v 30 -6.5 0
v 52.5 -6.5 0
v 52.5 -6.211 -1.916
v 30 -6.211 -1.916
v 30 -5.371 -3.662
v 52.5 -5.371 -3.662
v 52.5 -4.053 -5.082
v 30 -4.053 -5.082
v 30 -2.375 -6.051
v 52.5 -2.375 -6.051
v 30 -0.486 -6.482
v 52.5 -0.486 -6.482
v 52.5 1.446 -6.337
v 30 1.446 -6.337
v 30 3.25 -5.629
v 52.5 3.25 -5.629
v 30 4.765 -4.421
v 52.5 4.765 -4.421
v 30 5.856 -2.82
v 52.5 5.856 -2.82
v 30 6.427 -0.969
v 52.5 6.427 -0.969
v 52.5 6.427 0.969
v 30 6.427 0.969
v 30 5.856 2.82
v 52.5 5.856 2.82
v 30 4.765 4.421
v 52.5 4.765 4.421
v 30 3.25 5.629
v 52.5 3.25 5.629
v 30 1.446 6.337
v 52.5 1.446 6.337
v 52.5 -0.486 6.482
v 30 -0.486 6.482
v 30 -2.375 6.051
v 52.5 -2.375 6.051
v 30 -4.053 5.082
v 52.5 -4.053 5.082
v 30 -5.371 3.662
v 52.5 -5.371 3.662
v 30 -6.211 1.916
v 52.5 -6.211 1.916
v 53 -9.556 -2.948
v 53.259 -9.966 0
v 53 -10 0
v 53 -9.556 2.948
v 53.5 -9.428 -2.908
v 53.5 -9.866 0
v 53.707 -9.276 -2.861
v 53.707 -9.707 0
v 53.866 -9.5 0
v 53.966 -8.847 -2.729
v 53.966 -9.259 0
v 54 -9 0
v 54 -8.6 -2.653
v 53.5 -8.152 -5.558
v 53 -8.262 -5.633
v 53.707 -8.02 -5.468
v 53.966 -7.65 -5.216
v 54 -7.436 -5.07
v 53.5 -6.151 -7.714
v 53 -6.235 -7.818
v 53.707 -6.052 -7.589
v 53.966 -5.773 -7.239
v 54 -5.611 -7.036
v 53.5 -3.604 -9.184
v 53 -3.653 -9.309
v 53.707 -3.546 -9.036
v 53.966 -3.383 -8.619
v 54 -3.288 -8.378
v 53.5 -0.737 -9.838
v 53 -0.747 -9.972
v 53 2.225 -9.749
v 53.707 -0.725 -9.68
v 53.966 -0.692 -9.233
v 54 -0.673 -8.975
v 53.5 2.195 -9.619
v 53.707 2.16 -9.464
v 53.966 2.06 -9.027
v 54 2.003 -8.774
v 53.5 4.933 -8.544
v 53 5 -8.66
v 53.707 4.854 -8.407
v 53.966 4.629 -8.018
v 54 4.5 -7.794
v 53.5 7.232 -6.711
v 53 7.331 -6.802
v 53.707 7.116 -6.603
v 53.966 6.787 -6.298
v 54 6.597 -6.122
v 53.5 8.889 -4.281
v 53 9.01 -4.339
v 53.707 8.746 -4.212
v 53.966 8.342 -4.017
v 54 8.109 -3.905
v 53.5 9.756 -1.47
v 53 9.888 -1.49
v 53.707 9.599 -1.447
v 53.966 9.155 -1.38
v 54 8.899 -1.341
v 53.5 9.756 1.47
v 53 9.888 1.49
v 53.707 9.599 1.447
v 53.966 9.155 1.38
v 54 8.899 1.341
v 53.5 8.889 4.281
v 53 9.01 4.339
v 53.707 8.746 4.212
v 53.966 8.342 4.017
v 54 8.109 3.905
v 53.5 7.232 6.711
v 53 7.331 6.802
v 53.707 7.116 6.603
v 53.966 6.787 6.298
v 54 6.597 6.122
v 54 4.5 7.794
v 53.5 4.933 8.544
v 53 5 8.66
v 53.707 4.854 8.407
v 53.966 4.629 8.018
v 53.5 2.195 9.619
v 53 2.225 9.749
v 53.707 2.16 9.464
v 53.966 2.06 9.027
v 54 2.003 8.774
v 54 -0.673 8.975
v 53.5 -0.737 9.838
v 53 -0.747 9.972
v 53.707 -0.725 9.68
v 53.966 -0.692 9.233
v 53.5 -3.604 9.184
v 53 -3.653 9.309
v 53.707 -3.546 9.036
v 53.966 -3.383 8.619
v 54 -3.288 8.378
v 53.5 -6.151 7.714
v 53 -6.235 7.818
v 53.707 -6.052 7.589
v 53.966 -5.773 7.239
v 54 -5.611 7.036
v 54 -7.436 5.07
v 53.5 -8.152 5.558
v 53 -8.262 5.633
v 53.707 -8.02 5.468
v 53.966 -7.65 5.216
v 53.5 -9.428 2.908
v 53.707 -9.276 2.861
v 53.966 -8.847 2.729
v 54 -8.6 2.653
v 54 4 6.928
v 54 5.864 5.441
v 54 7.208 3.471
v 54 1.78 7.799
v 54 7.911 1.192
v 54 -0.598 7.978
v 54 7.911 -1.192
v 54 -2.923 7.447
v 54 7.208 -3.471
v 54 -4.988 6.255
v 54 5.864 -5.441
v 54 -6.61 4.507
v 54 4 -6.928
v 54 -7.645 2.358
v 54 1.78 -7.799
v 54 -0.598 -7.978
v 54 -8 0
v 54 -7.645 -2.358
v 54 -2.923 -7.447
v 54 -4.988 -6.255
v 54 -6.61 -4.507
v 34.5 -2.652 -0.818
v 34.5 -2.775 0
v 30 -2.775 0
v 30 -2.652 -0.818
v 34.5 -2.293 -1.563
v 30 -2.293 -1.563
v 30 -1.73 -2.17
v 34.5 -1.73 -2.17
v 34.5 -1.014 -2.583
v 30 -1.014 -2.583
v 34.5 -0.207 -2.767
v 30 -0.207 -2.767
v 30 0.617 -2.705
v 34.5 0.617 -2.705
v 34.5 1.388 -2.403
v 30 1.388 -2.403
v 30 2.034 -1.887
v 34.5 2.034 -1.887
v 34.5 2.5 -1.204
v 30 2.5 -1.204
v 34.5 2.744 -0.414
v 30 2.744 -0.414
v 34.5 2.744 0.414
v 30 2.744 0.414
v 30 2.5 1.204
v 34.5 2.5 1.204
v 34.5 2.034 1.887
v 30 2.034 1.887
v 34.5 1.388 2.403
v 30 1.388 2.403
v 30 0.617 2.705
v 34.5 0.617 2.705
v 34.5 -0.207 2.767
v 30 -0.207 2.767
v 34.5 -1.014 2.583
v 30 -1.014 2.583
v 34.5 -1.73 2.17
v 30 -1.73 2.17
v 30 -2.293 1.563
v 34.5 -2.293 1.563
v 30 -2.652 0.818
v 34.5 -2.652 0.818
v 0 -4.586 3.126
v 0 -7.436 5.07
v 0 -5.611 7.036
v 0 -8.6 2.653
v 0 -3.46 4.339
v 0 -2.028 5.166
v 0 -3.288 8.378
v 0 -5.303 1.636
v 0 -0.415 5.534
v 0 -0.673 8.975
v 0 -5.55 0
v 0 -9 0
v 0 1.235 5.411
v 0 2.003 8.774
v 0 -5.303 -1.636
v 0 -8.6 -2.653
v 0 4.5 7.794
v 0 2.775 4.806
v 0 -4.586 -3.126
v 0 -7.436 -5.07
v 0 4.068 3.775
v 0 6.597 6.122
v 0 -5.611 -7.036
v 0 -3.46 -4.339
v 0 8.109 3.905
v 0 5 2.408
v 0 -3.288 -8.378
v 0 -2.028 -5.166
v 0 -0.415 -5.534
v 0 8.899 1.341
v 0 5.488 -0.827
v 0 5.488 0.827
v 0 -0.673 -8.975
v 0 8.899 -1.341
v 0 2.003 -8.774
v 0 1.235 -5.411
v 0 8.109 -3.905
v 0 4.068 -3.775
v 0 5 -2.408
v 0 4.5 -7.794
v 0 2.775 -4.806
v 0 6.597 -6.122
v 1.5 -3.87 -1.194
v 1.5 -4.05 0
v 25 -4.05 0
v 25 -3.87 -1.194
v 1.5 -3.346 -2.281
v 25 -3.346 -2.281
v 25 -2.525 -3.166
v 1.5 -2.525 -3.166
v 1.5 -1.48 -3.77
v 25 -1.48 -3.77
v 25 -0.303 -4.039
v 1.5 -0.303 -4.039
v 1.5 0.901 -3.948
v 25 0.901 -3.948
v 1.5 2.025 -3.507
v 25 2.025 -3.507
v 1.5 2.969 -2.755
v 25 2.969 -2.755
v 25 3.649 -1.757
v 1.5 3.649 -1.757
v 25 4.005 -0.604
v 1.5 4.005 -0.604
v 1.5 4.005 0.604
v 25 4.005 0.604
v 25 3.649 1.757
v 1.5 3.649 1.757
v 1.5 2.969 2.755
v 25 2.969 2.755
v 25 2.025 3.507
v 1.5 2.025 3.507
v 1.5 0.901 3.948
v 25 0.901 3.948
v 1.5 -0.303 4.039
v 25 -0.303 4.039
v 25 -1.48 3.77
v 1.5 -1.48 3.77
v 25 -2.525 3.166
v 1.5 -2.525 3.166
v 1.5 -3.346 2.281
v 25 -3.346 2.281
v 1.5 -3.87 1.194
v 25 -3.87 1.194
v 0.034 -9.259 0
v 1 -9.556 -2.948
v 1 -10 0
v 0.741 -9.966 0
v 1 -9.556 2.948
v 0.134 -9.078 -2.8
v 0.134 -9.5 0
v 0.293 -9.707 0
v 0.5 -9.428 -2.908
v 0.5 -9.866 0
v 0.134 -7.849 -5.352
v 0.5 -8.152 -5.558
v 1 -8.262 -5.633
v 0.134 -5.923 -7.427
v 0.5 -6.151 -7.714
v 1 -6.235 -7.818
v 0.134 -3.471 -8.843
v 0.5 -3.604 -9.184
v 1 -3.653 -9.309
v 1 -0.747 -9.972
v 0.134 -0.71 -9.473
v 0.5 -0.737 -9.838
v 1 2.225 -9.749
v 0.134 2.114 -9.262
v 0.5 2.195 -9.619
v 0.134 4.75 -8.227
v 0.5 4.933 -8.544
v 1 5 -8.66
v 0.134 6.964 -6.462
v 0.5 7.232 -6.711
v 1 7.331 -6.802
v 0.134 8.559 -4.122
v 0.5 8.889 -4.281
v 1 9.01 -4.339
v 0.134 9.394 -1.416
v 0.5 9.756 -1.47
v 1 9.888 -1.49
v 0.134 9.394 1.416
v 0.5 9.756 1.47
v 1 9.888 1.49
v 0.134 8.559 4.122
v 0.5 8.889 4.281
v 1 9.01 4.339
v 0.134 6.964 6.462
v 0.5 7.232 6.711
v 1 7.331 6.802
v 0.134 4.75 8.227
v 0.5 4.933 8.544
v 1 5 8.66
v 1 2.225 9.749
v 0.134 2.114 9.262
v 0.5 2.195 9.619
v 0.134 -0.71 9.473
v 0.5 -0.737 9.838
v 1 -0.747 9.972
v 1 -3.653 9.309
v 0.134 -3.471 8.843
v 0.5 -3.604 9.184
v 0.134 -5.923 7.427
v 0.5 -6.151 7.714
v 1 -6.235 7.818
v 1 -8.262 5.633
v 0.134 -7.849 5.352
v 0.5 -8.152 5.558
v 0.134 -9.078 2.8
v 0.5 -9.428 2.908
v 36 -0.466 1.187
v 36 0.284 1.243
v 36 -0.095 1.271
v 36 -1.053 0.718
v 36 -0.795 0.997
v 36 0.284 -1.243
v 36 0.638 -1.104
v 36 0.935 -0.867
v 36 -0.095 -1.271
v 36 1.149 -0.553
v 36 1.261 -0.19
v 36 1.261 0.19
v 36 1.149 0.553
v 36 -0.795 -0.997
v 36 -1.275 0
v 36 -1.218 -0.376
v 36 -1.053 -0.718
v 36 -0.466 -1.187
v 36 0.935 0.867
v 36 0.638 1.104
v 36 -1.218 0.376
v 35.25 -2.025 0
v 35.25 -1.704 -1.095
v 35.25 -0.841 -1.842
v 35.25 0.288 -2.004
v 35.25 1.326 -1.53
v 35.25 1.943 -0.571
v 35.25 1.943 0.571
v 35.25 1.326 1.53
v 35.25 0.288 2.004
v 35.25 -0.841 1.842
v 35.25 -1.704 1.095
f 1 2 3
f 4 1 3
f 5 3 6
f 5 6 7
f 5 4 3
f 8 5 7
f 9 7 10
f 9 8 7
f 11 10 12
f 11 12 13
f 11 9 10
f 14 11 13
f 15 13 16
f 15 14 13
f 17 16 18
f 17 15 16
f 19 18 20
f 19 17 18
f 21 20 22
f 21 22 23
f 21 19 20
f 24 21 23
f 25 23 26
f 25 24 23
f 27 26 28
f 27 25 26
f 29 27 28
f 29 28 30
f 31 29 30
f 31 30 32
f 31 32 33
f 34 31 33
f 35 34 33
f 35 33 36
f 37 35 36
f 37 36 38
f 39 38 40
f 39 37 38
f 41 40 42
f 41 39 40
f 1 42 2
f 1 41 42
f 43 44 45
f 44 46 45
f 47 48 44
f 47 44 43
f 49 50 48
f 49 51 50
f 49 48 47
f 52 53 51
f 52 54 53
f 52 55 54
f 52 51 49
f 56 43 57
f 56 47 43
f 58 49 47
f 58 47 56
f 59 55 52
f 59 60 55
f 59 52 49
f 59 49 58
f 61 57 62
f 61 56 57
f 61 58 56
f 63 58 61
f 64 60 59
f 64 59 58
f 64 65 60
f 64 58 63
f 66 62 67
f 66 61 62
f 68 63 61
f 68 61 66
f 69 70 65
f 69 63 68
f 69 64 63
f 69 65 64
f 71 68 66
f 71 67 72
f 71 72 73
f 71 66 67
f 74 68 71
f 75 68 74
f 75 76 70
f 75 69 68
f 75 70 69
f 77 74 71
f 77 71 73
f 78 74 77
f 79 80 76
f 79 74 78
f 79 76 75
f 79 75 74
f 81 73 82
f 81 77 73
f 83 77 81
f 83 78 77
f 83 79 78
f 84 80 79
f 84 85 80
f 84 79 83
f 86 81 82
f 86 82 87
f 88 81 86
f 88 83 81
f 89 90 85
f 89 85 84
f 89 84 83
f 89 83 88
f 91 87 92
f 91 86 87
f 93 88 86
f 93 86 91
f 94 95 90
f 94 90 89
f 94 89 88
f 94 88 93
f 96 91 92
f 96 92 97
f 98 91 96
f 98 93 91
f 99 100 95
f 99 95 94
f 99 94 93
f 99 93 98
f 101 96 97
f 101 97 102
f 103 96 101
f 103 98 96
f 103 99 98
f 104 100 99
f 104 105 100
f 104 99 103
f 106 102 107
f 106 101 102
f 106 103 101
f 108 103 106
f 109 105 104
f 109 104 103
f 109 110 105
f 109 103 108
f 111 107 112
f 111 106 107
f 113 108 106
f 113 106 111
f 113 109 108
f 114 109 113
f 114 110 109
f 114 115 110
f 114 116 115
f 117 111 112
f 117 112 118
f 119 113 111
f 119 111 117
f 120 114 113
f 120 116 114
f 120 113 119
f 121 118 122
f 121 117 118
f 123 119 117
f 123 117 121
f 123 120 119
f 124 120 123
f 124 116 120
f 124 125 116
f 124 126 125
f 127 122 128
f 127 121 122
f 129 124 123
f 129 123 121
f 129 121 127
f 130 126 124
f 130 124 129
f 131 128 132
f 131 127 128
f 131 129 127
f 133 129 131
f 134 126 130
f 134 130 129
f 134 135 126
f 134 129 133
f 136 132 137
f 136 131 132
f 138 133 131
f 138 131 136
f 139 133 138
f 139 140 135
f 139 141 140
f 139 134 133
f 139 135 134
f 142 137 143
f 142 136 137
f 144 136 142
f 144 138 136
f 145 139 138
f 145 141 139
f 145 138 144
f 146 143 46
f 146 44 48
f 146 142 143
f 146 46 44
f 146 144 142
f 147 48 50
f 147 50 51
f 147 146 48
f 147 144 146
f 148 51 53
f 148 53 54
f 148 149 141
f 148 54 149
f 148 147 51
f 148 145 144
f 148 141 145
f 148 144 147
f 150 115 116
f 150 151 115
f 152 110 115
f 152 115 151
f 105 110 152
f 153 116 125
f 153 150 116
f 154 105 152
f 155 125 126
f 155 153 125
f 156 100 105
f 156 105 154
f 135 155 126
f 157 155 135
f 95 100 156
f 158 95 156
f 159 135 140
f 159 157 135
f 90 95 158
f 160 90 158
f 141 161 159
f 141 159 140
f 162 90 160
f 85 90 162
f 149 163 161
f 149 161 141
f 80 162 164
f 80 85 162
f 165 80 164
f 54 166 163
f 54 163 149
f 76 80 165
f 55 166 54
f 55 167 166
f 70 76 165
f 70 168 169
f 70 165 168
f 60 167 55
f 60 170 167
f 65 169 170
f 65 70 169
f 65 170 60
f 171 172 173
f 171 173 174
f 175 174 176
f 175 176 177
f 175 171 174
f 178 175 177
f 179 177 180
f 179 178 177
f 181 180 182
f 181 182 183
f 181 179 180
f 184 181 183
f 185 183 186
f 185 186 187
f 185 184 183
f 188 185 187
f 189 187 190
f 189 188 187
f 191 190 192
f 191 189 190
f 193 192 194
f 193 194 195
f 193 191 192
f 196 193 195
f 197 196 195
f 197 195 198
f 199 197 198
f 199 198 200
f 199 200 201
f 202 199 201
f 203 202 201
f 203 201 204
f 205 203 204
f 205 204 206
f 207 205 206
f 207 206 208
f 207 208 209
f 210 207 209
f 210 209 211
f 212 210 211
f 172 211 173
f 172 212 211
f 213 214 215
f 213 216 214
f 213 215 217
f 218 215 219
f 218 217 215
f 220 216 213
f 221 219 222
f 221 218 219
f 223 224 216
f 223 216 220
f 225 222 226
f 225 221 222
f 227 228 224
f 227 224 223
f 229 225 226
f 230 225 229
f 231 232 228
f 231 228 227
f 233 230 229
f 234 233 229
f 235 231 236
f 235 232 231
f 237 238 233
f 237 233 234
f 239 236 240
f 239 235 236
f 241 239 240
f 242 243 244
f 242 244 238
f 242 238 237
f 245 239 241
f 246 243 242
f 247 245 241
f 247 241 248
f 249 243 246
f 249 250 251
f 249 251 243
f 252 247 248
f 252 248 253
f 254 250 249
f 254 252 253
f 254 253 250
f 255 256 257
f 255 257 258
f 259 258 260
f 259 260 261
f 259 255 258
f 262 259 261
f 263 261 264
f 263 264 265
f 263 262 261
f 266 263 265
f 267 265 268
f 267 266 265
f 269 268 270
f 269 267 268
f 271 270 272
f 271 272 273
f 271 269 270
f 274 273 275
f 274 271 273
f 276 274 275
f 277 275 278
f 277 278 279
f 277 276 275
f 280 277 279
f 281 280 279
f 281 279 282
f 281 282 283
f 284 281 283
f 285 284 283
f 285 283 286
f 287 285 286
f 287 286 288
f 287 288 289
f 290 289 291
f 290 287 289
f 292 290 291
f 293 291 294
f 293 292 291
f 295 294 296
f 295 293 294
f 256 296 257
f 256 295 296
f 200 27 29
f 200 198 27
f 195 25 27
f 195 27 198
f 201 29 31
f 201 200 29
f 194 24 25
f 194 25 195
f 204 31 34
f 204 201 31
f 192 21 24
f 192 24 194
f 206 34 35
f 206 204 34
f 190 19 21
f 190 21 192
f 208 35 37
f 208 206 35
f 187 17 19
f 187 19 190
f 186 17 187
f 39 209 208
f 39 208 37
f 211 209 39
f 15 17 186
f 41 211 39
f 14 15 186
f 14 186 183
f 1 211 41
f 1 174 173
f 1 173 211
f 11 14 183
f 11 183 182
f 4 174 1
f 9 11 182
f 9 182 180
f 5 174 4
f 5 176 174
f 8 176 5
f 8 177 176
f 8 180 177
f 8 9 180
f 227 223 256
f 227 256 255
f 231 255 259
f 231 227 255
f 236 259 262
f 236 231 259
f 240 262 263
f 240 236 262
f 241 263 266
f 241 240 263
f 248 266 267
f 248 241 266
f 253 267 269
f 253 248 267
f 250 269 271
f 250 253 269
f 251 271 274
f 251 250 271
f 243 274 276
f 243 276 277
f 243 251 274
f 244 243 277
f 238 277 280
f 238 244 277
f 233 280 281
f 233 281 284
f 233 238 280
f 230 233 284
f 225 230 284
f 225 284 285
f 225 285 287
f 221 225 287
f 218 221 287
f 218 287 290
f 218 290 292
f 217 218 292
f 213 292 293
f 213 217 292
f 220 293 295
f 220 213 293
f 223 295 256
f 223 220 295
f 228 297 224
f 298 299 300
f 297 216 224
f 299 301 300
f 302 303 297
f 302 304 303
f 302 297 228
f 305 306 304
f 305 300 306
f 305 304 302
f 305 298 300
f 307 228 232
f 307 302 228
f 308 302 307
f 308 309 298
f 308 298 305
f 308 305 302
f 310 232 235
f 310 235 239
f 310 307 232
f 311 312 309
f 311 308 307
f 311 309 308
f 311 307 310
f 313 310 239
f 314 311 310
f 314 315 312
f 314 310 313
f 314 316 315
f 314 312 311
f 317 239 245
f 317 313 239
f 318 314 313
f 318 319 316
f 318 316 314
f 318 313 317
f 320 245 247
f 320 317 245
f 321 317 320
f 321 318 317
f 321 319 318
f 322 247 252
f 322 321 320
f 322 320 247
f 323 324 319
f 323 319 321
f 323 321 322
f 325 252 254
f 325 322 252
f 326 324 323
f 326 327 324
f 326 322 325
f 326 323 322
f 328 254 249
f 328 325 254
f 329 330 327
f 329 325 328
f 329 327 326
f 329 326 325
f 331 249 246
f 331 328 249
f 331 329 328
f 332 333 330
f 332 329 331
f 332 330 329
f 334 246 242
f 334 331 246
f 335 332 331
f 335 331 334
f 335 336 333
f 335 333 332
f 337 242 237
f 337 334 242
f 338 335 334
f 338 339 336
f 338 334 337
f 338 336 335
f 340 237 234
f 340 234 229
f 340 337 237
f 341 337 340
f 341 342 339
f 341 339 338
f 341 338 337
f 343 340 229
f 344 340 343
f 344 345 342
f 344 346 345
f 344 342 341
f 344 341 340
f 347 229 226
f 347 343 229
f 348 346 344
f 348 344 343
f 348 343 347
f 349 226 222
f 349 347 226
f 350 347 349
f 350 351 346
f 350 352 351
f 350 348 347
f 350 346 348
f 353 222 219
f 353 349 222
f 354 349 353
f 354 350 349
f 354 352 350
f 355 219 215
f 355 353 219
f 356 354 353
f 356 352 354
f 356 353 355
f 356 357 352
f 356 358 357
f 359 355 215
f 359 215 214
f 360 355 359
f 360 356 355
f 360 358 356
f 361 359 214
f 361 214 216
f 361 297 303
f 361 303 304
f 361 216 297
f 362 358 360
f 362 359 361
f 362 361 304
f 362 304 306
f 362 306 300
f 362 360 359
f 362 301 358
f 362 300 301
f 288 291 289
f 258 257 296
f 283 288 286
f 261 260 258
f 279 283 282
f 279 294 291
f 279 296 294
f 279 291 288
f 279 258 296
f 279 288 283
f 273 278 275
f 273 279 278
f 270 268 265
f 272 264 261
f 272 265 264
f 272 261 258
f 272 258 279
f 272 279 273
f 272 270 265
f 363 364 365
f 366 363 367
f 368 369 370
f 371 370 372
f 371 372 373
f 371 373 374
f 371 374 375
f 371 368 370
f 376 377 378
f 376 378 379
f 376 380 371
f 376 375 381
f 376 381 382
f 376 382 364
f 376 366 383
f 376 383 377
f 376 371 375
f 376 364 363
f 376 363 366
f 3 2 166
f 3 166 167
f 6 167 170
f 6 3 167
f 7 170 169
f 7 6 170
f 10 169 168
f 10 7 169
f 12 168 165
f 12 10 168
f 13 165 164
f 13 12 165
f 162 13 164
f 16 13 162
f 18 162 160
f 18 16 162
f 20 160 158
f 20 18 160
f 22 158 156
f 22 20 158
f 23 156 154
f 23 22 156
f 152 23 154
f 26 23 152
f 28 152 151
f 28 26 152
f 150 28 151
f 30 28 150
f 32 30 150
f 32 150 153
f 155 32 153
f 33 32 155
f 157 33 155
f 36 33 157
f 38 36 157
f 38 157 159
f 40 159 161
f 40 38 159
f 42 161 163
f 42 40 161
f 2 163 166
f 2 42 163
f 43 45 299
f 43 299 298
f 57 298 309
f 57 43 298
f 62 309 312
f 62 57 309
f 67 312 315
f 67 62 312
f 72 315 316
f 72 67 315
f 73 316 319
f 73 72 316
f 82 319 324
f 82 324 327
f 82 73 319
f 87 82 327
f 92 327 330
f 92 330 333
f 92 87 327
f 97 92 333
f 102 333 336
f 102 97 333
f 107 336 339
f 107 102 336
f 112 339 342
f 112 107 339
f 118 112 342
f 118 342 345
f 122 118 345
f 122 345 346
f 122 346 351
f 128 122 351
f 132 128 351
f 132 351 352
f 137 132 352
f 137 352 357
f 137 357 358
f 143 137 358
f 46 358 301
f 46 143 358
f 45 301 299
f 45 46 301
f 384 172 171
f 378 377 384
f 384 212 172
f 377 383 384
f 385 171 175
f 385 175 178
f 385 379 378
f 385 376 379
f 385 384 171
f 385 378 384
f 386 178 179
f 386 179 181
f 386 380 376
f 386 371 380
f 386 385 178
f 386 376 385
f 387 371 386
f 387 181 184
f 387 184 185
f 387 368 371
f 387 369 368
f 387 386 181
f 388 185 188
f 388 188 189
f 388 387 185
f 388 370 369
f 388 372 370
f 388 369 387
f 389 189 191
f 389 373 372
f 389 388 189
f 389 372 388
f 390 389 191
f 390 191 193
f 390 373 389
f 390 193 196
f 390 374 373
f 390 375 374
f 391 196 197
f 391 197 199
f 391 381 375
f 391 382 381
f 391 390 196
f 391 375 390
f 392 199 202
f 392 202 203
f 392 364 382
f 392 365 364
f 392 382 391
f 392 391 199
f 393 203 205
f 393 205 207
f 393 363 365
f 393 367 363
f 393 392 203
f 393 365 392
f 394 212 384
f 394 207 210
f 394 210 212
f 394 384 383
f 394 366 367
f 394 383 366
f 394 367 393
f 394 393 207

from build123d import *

# Parameters (mm, degrees)
CHAMFER1_SIZE = 1.5
FILLET1_R     = 1


with BuildPart() as part:
    # Sketch1 → Revolve1 (revolve)
    with BuildSketch(Plane.XY, mode=Mode.PRIVATE) as revolve1_sk:
        Polygon((25, 4.05), (0, 4.05), (0, 10), (54, 10), (54, 6.5), (30, 6.5), (30, 2.775), (36, 2.775), (36, 0), (25, 0), align=None)
    revolve(revolve1_sk.sketch.rotate(Axis((0, 0, 0), (1, 0, 0)), 180), axis=Axis((0, 0, 0), (1, 0, 0)))

    # Chamfer1
    chamfer1_edges = [part.edges().sort_by_distance(p)[0] for p in [
        (0, 4.05, 0),
        (36, 2.775, 0),
        (54, 6.5, 0),
    ]]
    chamfer(chamfer1_edges, length=CHAMFER1_SIZE)

    # Fillet1
    fillet1_edges = [part.edges().sort_by_distance(p)[0] for p in [
        (54, 10, 0),
        (0, 10, 0),
    ]]
    fillet(fillet1_edges, radius=FILLET1_R)


solid = part.part
